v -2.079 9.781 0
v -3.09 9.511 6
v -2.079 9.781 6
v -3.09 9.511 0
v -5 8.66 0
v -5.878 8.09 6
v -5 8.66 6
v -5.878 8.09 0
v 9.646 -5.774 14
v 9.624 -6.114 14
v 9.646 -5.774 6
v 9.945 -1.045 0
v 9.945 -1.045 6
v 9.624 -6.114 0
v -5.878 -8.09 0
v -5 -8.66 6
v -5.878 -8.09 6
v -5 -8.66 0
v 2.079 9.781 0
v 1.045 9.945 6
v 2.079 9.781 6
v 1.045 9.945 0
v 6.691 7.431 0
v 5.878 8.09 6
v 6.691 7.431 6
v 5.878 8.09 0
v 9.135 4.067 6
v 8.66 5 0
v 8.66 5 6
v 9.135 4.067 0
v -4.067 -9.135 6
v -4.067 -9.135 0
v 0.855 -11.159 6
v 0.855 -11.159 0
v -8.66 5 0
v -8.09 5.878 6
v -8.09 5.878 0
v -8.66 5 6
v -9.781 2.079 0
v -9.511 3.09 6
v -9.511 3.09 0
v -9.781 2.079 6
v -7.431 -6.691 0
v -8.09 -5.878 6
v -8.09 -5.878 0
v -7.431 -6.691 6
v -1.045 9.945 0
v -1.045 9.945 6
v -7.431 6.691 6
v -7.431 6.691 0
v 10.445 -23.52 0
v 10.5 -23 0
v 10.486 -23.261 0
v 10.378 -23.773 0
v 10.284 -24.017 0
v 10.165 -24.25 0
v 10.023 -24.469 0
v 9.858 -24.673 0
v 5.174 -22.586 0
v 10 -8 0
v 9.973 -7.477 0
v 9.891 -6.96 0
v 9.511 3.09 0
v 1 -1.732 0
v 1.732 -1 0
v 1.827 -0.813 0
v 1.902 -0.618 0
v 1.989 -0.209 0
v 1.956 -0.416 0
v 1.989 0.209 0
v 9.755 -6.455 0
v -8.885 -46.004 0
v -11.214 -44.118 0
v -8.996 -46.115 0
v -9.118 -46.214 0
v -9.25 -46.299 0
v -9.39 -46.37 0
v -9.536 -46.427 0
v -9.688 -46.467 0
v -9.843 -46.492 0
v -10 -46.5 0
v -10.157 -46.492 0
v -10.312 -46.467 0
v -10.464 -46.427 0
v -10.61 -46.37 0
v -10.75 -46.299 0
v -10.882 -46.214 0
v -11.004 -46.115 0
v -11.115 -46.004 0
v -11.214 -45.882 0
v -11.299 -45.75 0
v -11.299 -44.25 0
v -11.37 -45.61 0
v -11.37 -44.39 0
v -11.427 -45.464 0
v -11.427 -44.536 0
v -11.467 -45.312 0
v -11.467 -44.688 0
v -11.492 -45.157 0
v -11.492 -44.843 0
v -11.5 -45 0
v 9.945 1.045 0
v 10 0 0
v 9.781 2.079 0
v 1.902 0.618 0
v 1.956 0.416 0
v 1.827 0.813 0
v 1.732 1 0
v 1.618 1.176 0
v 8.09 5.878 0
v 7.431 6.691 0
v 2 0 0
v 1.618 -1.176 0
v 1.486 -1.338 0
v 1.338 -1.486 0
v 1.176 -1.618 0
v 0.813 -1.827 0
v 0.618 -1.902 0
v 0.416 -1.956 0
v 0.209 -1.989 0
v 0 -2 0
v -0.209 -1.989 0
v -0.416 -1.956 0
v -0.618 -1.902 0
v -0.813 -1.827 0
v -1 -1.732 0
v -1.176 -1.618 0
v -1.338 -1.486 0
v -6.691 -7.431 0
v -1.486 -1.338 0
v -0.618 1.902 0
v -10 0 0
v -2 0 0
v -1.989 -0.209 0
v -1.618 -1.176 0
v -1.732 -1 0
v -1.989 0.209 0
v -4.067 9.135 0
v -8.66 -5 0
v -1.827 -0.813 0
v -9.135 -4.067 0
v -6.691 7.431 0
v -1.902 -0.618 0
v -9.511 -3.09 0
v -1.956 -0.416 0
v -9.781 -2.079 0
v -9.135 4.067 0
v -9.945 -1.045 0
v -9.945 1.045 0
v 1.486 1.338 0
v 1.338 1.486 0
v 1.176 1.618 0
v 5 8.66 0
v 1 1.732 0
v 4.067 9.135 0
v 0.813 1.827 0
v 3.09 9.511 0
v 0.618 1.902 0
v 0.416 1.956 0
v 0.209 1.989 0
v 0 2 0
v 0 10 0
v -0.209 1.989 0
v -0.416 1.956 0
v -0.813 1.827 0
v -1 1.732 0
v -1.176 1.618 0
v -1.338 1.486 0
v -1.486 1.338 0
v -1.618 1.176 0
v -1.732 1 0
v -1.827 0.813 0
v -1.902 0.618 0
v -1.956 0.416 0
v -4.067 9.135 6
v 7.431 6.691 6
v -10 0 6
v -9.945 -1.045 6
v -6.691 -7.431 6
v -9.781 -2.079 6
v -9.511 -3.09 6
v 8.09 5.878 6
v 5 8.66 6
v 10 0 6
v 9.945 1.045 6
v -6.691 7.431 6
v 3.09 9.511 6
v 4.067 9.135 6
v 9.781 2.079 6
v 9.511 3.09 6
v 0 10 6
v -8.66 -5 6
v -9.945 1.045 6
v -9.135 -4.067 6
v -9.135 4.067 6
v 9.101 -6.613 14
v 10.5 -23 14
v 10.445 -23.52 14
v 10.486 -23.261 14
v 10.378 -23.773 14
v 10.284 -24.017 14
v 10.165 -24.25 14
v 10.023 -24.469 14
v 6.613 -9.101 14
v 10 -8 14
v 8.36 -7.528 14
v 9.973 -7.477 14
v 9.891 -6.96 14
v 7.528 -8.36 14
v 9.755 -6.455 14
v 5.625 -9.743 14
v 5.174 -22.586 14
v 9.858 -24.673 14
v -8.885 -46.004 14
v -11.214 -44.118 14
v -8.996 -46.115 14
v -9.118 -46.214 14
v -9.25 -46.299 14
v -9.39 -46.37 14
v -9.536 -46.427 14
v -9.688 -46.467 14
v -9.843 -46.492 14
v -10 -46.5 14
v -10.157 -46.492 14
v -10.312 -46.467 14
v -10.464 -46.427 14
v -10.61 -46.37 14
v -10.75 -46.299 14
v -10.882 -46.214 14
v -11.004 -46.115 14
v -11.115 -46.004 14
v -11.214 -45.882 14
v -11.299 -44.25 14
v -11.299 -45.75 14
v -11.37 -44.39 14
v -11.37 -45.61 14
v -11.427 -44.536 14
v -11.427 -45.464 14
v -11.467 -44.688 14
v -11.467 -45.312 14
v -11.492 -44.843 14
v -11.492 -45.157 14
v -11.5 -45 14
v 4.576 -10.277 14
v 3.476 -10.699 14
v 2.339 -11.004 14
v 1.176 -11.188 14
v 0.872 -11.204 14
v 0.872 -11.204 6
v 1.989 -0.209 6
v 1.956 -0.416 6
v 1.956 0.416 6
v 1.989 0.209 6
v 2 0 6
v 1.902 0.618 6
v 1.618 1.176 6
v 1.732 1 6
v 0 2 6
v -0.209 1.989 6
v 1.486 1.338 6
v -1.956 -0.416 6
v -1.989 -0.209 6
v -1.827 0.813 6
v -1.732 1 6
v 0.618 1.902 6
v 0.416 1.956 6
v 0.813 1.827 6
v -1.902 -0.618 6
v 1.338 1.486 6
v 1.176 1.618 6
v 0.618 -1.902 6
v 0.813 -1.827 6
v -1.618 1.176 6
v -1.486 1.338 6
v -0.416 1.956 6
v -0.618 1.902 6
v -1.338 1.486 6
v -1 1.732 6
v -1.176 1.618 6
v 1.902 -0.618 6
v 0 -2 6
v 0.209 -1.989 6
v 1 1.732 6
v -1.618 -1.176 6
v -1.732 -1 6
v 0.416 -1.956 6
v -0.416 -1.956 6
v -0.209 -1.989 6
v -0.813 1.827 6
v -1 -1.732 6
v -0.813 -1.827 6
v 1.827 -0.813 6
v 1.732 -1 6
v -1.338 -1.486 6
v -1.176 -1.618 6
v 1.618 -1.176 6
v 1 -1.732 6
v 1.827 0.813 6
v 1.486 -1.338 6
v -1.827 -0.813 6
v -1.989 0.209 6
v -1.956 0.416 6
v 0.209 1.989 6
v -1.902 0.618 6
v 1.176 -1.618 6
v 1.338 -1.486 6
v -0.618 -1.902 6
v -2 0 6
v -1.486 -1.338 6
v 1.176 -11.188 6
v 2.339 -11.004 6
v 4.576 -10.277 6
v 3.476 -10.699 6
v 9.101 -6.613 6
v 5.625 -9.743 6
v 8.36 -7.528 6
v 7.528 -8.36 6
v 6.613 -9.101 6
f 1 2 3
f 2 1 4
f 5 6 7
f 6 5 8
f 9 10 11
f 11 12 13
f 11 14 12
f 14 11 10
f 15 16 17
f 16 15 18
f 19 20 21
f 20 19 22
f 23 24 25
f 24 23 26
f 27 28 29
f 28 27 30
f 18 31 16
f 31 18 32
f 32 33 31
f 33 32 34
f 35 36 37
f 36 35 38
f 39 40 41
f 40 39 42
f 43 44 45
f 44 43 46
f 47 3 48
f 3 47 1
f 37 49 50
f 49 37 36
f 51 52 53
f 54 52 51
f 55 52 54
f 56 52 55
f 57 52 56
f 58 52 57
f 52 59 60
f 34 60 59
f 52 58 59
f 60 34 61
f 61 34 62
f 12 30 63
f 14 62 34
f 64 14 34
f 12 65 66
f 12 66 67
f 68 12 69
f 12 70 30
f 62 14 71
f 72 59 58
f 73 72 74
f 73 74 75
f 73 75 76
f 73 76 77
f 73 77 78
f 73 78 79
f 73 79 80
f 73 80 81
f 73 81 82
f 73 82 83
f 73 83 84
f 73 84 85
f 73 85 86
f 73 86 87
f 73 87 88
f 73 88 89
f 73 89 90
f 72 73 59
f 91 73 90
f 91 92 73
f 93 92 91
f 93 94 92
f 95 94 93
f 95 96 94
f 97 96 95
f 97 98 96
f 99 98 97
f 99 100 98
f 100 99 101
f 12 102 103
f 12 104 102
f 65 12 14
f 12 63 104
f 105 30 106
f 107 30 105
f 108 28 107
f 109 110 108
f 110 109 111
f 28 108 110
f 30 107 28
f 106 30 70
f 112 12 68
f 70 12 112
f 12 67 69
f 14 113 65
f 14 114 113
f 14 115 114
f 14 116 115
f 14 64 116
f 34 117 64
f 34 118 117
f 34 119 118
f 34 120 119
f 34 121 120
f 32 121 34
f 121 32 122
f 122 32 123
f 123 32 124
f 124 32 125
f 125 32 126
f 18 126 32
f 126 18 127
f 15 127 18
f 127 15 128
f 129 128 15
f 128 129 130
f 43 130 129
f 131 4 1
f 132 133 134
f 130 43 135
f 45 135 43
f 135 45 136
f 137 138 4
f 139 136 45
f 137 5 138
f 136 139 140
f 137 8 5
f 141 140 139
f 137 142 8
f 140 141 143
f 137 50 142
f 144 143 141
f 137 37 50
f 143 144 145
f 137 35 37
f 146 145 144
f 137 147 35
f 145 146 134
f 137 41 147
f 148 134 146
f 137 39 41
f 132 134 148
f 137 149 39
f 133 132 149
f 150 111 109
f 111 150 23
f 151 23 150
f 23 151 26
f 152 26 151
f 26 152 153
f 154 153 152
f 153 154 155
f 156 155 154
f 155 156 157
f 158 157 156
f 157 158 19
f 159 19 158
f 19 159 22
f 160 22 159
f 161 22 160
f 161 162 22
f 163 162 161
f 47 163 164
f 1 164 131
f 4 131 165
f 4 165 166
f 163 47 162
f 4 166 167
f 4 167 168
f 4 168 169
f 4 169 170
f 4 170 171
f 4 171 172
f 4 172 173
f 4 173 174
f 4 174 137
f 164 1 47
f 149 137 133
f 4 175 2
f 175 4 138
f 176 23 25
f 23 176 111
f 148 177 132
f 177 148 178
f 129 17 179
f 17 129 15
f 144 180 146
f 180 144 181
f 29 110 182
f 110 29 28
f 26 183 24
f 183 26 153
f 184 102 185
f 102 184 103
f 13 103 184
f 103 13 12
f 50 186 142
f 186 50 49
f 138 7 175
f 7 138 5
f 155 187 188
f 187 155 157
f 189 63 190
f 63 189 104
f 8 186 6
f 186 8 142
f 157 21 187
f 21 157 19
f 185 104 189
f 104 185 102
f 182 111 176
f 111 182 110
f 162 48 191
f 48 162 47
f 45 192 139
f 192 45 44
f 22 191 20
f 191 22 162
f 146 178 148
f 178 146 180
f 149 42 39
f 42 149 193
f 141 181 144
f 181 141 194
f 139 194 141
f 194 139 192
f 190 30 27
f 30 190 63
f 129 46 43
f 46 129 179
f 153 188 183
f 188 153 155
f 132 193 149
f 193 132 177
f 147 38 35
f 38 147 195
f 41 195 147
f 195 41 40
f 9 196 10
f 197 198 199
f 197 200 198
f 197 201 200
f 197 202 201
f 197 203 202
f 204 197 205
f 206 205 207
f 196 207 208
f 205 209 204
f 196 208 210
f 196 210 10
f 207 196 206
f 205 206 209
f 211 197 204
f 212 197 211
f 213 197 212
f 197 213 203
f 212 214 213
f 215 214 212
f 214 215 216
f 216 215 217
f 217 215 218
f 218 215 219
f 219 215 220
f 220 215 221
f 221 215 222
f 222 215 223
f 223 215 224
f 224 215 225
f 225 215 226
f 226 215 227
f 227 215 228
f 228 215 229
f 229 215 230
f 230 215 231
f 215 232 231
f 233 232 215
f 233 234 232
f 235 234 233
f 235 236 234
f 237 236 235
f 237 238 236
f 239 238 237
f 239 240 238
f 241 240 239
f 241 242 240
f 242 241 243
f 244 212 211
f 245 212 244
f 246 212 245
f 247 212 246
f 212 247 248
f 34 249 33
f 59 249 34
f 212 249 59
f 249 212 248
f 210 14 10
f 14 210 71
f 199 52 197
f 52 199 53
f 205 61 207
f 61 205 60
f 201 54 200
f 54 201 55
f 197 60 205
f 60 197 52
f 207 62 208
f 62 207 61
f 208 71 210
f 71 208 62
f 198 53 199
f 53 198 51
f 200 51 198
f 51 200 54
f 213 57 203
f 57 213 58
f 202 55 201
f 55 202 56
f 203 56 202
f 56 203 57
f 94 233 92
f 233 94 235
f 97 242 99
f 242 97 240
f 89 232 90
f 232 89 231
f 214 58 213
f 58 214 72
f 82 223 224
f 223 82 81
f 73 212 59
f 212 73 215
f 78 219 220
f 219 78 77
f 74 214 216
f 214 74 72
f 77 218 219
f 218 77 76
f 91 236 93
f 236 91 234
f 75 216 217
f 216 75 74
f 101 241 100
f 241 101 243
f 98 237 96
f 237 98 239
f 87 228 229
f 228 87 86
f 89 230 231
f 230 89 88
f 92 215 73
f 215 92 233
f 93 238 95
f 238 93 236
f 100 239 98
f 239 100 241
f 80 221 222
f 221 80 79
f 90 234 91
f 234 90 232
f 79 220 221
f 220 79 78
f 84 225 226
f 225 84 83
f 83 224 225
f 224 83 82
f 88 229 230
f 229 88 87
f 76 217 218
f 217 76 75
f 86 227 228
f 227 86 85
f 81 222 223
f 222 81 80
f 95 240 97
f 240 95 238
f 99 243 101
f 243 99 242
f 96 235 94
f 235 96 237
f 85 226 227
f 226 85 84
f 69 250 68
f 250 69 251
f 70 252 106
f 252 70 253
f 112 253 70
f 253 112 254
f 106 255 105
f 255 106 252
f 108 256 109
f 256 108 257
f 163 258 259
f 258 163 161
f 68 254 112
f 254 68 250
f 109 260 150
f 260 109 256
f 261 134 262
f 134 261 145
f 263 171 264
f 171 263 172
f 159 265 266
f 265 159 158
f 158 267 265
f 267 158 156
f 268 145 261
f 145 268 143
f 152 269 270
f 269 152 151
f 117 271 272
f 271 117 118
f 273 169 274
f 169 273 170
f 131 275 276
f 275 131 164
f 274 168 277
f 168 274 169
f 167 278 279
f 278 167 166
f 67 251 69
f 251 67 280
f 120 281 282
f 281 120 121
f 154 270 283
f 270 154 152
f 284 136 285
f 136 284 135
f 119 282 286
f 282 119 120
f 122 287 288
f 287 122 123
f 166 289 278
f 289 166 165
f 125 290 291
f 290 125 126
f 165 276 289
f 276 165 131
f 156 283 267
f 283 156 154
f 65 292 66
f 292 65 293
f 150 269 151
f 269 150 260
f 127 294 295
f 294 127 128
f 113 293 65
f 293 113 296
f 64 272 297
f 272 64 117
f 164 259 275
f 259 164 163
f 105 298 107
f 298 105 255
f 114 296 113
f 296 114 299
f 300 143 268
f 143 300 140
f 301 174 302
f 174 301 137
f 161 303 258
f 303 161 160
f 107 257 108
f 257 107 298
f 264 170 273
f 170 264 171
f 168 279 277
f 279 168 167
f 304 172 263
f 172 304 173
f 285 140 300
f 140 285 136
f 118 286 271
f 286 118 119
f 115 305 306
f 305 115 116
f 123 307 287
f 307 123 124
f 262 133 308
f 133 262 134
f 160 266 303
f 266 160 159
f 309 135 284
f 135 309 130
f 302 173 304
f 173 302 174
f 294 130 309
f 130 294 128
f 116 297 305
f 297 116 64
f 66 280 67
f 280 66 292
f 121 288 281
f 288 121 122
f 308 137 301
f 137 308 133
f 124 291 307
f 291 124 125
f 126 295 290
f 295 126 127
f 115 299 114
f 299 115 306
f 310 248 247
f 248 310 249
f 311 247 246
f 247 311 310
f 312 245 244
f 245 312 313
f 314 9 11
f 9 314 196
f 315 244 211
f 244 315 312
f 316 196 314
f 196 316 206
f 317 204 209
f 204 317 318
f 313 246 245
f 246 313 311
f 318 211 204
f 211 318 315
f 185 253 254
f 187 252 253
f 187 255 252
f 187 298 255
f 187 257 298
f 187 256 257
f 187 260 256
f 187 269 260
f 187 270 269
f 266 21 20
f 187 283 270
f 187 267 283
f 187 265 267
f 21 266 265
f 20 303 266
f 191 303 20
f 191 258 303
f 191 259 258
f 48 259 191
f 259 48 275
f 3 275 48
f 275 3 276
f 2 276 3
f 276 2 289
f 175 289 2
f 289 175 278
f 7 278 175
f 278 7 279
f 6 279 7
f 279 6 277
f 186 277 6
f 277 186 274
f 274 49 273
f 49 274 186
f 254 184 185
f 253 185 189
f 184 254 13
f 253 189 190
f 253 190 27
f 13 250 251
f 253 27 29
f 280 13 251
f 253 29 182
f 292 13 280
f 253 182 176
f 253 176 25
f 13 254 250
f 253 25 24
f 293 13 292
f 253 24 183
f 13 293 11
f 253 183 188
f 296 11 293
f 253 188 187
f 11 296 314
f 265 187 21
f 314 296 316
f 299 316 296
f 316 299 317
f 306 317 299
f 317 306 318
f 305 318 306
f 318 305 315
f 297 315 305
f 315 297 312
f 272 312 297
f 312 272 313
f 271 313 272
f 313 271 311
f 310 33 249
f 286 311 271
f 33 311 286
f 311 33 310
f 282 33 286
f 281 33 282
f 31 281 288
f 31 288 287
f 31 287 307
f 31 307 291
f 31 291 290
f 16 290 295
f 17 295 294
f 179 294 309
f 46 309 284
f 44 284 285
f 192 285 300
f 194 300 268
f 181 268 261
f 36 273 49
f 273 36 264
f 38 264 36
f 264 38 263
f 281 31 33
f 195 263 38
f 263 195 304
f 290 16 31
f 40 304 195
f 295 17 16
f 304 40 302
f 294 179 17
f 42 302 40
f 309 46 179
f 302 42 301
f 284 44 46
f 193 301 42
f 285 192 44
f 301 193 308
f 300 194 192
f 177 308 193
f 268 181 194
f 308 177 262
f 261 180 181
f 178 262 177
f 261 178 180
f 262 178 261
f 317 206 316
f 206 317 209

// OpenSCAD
$fn=60;

difference(){

union(){

hull(){
cylinder(d=20,h=14);
translate([5,-8,0])
cylinder(d=9,h=14);
}

hull(){
translate([5,-8,0])
cylinder(d=10,h=14);
translate([8,-23,0])
cylinder(d=5,h=14);
}

hull(){
translate([8,-23,0])
cylinder(d=5,h=14);
translate([-10,-45,0])
cylinder(d=3,h=14);
}

}

cylinder(d=4,h=22);
translate([0,0,6])cylinder(d=22.5,h=20);
}
